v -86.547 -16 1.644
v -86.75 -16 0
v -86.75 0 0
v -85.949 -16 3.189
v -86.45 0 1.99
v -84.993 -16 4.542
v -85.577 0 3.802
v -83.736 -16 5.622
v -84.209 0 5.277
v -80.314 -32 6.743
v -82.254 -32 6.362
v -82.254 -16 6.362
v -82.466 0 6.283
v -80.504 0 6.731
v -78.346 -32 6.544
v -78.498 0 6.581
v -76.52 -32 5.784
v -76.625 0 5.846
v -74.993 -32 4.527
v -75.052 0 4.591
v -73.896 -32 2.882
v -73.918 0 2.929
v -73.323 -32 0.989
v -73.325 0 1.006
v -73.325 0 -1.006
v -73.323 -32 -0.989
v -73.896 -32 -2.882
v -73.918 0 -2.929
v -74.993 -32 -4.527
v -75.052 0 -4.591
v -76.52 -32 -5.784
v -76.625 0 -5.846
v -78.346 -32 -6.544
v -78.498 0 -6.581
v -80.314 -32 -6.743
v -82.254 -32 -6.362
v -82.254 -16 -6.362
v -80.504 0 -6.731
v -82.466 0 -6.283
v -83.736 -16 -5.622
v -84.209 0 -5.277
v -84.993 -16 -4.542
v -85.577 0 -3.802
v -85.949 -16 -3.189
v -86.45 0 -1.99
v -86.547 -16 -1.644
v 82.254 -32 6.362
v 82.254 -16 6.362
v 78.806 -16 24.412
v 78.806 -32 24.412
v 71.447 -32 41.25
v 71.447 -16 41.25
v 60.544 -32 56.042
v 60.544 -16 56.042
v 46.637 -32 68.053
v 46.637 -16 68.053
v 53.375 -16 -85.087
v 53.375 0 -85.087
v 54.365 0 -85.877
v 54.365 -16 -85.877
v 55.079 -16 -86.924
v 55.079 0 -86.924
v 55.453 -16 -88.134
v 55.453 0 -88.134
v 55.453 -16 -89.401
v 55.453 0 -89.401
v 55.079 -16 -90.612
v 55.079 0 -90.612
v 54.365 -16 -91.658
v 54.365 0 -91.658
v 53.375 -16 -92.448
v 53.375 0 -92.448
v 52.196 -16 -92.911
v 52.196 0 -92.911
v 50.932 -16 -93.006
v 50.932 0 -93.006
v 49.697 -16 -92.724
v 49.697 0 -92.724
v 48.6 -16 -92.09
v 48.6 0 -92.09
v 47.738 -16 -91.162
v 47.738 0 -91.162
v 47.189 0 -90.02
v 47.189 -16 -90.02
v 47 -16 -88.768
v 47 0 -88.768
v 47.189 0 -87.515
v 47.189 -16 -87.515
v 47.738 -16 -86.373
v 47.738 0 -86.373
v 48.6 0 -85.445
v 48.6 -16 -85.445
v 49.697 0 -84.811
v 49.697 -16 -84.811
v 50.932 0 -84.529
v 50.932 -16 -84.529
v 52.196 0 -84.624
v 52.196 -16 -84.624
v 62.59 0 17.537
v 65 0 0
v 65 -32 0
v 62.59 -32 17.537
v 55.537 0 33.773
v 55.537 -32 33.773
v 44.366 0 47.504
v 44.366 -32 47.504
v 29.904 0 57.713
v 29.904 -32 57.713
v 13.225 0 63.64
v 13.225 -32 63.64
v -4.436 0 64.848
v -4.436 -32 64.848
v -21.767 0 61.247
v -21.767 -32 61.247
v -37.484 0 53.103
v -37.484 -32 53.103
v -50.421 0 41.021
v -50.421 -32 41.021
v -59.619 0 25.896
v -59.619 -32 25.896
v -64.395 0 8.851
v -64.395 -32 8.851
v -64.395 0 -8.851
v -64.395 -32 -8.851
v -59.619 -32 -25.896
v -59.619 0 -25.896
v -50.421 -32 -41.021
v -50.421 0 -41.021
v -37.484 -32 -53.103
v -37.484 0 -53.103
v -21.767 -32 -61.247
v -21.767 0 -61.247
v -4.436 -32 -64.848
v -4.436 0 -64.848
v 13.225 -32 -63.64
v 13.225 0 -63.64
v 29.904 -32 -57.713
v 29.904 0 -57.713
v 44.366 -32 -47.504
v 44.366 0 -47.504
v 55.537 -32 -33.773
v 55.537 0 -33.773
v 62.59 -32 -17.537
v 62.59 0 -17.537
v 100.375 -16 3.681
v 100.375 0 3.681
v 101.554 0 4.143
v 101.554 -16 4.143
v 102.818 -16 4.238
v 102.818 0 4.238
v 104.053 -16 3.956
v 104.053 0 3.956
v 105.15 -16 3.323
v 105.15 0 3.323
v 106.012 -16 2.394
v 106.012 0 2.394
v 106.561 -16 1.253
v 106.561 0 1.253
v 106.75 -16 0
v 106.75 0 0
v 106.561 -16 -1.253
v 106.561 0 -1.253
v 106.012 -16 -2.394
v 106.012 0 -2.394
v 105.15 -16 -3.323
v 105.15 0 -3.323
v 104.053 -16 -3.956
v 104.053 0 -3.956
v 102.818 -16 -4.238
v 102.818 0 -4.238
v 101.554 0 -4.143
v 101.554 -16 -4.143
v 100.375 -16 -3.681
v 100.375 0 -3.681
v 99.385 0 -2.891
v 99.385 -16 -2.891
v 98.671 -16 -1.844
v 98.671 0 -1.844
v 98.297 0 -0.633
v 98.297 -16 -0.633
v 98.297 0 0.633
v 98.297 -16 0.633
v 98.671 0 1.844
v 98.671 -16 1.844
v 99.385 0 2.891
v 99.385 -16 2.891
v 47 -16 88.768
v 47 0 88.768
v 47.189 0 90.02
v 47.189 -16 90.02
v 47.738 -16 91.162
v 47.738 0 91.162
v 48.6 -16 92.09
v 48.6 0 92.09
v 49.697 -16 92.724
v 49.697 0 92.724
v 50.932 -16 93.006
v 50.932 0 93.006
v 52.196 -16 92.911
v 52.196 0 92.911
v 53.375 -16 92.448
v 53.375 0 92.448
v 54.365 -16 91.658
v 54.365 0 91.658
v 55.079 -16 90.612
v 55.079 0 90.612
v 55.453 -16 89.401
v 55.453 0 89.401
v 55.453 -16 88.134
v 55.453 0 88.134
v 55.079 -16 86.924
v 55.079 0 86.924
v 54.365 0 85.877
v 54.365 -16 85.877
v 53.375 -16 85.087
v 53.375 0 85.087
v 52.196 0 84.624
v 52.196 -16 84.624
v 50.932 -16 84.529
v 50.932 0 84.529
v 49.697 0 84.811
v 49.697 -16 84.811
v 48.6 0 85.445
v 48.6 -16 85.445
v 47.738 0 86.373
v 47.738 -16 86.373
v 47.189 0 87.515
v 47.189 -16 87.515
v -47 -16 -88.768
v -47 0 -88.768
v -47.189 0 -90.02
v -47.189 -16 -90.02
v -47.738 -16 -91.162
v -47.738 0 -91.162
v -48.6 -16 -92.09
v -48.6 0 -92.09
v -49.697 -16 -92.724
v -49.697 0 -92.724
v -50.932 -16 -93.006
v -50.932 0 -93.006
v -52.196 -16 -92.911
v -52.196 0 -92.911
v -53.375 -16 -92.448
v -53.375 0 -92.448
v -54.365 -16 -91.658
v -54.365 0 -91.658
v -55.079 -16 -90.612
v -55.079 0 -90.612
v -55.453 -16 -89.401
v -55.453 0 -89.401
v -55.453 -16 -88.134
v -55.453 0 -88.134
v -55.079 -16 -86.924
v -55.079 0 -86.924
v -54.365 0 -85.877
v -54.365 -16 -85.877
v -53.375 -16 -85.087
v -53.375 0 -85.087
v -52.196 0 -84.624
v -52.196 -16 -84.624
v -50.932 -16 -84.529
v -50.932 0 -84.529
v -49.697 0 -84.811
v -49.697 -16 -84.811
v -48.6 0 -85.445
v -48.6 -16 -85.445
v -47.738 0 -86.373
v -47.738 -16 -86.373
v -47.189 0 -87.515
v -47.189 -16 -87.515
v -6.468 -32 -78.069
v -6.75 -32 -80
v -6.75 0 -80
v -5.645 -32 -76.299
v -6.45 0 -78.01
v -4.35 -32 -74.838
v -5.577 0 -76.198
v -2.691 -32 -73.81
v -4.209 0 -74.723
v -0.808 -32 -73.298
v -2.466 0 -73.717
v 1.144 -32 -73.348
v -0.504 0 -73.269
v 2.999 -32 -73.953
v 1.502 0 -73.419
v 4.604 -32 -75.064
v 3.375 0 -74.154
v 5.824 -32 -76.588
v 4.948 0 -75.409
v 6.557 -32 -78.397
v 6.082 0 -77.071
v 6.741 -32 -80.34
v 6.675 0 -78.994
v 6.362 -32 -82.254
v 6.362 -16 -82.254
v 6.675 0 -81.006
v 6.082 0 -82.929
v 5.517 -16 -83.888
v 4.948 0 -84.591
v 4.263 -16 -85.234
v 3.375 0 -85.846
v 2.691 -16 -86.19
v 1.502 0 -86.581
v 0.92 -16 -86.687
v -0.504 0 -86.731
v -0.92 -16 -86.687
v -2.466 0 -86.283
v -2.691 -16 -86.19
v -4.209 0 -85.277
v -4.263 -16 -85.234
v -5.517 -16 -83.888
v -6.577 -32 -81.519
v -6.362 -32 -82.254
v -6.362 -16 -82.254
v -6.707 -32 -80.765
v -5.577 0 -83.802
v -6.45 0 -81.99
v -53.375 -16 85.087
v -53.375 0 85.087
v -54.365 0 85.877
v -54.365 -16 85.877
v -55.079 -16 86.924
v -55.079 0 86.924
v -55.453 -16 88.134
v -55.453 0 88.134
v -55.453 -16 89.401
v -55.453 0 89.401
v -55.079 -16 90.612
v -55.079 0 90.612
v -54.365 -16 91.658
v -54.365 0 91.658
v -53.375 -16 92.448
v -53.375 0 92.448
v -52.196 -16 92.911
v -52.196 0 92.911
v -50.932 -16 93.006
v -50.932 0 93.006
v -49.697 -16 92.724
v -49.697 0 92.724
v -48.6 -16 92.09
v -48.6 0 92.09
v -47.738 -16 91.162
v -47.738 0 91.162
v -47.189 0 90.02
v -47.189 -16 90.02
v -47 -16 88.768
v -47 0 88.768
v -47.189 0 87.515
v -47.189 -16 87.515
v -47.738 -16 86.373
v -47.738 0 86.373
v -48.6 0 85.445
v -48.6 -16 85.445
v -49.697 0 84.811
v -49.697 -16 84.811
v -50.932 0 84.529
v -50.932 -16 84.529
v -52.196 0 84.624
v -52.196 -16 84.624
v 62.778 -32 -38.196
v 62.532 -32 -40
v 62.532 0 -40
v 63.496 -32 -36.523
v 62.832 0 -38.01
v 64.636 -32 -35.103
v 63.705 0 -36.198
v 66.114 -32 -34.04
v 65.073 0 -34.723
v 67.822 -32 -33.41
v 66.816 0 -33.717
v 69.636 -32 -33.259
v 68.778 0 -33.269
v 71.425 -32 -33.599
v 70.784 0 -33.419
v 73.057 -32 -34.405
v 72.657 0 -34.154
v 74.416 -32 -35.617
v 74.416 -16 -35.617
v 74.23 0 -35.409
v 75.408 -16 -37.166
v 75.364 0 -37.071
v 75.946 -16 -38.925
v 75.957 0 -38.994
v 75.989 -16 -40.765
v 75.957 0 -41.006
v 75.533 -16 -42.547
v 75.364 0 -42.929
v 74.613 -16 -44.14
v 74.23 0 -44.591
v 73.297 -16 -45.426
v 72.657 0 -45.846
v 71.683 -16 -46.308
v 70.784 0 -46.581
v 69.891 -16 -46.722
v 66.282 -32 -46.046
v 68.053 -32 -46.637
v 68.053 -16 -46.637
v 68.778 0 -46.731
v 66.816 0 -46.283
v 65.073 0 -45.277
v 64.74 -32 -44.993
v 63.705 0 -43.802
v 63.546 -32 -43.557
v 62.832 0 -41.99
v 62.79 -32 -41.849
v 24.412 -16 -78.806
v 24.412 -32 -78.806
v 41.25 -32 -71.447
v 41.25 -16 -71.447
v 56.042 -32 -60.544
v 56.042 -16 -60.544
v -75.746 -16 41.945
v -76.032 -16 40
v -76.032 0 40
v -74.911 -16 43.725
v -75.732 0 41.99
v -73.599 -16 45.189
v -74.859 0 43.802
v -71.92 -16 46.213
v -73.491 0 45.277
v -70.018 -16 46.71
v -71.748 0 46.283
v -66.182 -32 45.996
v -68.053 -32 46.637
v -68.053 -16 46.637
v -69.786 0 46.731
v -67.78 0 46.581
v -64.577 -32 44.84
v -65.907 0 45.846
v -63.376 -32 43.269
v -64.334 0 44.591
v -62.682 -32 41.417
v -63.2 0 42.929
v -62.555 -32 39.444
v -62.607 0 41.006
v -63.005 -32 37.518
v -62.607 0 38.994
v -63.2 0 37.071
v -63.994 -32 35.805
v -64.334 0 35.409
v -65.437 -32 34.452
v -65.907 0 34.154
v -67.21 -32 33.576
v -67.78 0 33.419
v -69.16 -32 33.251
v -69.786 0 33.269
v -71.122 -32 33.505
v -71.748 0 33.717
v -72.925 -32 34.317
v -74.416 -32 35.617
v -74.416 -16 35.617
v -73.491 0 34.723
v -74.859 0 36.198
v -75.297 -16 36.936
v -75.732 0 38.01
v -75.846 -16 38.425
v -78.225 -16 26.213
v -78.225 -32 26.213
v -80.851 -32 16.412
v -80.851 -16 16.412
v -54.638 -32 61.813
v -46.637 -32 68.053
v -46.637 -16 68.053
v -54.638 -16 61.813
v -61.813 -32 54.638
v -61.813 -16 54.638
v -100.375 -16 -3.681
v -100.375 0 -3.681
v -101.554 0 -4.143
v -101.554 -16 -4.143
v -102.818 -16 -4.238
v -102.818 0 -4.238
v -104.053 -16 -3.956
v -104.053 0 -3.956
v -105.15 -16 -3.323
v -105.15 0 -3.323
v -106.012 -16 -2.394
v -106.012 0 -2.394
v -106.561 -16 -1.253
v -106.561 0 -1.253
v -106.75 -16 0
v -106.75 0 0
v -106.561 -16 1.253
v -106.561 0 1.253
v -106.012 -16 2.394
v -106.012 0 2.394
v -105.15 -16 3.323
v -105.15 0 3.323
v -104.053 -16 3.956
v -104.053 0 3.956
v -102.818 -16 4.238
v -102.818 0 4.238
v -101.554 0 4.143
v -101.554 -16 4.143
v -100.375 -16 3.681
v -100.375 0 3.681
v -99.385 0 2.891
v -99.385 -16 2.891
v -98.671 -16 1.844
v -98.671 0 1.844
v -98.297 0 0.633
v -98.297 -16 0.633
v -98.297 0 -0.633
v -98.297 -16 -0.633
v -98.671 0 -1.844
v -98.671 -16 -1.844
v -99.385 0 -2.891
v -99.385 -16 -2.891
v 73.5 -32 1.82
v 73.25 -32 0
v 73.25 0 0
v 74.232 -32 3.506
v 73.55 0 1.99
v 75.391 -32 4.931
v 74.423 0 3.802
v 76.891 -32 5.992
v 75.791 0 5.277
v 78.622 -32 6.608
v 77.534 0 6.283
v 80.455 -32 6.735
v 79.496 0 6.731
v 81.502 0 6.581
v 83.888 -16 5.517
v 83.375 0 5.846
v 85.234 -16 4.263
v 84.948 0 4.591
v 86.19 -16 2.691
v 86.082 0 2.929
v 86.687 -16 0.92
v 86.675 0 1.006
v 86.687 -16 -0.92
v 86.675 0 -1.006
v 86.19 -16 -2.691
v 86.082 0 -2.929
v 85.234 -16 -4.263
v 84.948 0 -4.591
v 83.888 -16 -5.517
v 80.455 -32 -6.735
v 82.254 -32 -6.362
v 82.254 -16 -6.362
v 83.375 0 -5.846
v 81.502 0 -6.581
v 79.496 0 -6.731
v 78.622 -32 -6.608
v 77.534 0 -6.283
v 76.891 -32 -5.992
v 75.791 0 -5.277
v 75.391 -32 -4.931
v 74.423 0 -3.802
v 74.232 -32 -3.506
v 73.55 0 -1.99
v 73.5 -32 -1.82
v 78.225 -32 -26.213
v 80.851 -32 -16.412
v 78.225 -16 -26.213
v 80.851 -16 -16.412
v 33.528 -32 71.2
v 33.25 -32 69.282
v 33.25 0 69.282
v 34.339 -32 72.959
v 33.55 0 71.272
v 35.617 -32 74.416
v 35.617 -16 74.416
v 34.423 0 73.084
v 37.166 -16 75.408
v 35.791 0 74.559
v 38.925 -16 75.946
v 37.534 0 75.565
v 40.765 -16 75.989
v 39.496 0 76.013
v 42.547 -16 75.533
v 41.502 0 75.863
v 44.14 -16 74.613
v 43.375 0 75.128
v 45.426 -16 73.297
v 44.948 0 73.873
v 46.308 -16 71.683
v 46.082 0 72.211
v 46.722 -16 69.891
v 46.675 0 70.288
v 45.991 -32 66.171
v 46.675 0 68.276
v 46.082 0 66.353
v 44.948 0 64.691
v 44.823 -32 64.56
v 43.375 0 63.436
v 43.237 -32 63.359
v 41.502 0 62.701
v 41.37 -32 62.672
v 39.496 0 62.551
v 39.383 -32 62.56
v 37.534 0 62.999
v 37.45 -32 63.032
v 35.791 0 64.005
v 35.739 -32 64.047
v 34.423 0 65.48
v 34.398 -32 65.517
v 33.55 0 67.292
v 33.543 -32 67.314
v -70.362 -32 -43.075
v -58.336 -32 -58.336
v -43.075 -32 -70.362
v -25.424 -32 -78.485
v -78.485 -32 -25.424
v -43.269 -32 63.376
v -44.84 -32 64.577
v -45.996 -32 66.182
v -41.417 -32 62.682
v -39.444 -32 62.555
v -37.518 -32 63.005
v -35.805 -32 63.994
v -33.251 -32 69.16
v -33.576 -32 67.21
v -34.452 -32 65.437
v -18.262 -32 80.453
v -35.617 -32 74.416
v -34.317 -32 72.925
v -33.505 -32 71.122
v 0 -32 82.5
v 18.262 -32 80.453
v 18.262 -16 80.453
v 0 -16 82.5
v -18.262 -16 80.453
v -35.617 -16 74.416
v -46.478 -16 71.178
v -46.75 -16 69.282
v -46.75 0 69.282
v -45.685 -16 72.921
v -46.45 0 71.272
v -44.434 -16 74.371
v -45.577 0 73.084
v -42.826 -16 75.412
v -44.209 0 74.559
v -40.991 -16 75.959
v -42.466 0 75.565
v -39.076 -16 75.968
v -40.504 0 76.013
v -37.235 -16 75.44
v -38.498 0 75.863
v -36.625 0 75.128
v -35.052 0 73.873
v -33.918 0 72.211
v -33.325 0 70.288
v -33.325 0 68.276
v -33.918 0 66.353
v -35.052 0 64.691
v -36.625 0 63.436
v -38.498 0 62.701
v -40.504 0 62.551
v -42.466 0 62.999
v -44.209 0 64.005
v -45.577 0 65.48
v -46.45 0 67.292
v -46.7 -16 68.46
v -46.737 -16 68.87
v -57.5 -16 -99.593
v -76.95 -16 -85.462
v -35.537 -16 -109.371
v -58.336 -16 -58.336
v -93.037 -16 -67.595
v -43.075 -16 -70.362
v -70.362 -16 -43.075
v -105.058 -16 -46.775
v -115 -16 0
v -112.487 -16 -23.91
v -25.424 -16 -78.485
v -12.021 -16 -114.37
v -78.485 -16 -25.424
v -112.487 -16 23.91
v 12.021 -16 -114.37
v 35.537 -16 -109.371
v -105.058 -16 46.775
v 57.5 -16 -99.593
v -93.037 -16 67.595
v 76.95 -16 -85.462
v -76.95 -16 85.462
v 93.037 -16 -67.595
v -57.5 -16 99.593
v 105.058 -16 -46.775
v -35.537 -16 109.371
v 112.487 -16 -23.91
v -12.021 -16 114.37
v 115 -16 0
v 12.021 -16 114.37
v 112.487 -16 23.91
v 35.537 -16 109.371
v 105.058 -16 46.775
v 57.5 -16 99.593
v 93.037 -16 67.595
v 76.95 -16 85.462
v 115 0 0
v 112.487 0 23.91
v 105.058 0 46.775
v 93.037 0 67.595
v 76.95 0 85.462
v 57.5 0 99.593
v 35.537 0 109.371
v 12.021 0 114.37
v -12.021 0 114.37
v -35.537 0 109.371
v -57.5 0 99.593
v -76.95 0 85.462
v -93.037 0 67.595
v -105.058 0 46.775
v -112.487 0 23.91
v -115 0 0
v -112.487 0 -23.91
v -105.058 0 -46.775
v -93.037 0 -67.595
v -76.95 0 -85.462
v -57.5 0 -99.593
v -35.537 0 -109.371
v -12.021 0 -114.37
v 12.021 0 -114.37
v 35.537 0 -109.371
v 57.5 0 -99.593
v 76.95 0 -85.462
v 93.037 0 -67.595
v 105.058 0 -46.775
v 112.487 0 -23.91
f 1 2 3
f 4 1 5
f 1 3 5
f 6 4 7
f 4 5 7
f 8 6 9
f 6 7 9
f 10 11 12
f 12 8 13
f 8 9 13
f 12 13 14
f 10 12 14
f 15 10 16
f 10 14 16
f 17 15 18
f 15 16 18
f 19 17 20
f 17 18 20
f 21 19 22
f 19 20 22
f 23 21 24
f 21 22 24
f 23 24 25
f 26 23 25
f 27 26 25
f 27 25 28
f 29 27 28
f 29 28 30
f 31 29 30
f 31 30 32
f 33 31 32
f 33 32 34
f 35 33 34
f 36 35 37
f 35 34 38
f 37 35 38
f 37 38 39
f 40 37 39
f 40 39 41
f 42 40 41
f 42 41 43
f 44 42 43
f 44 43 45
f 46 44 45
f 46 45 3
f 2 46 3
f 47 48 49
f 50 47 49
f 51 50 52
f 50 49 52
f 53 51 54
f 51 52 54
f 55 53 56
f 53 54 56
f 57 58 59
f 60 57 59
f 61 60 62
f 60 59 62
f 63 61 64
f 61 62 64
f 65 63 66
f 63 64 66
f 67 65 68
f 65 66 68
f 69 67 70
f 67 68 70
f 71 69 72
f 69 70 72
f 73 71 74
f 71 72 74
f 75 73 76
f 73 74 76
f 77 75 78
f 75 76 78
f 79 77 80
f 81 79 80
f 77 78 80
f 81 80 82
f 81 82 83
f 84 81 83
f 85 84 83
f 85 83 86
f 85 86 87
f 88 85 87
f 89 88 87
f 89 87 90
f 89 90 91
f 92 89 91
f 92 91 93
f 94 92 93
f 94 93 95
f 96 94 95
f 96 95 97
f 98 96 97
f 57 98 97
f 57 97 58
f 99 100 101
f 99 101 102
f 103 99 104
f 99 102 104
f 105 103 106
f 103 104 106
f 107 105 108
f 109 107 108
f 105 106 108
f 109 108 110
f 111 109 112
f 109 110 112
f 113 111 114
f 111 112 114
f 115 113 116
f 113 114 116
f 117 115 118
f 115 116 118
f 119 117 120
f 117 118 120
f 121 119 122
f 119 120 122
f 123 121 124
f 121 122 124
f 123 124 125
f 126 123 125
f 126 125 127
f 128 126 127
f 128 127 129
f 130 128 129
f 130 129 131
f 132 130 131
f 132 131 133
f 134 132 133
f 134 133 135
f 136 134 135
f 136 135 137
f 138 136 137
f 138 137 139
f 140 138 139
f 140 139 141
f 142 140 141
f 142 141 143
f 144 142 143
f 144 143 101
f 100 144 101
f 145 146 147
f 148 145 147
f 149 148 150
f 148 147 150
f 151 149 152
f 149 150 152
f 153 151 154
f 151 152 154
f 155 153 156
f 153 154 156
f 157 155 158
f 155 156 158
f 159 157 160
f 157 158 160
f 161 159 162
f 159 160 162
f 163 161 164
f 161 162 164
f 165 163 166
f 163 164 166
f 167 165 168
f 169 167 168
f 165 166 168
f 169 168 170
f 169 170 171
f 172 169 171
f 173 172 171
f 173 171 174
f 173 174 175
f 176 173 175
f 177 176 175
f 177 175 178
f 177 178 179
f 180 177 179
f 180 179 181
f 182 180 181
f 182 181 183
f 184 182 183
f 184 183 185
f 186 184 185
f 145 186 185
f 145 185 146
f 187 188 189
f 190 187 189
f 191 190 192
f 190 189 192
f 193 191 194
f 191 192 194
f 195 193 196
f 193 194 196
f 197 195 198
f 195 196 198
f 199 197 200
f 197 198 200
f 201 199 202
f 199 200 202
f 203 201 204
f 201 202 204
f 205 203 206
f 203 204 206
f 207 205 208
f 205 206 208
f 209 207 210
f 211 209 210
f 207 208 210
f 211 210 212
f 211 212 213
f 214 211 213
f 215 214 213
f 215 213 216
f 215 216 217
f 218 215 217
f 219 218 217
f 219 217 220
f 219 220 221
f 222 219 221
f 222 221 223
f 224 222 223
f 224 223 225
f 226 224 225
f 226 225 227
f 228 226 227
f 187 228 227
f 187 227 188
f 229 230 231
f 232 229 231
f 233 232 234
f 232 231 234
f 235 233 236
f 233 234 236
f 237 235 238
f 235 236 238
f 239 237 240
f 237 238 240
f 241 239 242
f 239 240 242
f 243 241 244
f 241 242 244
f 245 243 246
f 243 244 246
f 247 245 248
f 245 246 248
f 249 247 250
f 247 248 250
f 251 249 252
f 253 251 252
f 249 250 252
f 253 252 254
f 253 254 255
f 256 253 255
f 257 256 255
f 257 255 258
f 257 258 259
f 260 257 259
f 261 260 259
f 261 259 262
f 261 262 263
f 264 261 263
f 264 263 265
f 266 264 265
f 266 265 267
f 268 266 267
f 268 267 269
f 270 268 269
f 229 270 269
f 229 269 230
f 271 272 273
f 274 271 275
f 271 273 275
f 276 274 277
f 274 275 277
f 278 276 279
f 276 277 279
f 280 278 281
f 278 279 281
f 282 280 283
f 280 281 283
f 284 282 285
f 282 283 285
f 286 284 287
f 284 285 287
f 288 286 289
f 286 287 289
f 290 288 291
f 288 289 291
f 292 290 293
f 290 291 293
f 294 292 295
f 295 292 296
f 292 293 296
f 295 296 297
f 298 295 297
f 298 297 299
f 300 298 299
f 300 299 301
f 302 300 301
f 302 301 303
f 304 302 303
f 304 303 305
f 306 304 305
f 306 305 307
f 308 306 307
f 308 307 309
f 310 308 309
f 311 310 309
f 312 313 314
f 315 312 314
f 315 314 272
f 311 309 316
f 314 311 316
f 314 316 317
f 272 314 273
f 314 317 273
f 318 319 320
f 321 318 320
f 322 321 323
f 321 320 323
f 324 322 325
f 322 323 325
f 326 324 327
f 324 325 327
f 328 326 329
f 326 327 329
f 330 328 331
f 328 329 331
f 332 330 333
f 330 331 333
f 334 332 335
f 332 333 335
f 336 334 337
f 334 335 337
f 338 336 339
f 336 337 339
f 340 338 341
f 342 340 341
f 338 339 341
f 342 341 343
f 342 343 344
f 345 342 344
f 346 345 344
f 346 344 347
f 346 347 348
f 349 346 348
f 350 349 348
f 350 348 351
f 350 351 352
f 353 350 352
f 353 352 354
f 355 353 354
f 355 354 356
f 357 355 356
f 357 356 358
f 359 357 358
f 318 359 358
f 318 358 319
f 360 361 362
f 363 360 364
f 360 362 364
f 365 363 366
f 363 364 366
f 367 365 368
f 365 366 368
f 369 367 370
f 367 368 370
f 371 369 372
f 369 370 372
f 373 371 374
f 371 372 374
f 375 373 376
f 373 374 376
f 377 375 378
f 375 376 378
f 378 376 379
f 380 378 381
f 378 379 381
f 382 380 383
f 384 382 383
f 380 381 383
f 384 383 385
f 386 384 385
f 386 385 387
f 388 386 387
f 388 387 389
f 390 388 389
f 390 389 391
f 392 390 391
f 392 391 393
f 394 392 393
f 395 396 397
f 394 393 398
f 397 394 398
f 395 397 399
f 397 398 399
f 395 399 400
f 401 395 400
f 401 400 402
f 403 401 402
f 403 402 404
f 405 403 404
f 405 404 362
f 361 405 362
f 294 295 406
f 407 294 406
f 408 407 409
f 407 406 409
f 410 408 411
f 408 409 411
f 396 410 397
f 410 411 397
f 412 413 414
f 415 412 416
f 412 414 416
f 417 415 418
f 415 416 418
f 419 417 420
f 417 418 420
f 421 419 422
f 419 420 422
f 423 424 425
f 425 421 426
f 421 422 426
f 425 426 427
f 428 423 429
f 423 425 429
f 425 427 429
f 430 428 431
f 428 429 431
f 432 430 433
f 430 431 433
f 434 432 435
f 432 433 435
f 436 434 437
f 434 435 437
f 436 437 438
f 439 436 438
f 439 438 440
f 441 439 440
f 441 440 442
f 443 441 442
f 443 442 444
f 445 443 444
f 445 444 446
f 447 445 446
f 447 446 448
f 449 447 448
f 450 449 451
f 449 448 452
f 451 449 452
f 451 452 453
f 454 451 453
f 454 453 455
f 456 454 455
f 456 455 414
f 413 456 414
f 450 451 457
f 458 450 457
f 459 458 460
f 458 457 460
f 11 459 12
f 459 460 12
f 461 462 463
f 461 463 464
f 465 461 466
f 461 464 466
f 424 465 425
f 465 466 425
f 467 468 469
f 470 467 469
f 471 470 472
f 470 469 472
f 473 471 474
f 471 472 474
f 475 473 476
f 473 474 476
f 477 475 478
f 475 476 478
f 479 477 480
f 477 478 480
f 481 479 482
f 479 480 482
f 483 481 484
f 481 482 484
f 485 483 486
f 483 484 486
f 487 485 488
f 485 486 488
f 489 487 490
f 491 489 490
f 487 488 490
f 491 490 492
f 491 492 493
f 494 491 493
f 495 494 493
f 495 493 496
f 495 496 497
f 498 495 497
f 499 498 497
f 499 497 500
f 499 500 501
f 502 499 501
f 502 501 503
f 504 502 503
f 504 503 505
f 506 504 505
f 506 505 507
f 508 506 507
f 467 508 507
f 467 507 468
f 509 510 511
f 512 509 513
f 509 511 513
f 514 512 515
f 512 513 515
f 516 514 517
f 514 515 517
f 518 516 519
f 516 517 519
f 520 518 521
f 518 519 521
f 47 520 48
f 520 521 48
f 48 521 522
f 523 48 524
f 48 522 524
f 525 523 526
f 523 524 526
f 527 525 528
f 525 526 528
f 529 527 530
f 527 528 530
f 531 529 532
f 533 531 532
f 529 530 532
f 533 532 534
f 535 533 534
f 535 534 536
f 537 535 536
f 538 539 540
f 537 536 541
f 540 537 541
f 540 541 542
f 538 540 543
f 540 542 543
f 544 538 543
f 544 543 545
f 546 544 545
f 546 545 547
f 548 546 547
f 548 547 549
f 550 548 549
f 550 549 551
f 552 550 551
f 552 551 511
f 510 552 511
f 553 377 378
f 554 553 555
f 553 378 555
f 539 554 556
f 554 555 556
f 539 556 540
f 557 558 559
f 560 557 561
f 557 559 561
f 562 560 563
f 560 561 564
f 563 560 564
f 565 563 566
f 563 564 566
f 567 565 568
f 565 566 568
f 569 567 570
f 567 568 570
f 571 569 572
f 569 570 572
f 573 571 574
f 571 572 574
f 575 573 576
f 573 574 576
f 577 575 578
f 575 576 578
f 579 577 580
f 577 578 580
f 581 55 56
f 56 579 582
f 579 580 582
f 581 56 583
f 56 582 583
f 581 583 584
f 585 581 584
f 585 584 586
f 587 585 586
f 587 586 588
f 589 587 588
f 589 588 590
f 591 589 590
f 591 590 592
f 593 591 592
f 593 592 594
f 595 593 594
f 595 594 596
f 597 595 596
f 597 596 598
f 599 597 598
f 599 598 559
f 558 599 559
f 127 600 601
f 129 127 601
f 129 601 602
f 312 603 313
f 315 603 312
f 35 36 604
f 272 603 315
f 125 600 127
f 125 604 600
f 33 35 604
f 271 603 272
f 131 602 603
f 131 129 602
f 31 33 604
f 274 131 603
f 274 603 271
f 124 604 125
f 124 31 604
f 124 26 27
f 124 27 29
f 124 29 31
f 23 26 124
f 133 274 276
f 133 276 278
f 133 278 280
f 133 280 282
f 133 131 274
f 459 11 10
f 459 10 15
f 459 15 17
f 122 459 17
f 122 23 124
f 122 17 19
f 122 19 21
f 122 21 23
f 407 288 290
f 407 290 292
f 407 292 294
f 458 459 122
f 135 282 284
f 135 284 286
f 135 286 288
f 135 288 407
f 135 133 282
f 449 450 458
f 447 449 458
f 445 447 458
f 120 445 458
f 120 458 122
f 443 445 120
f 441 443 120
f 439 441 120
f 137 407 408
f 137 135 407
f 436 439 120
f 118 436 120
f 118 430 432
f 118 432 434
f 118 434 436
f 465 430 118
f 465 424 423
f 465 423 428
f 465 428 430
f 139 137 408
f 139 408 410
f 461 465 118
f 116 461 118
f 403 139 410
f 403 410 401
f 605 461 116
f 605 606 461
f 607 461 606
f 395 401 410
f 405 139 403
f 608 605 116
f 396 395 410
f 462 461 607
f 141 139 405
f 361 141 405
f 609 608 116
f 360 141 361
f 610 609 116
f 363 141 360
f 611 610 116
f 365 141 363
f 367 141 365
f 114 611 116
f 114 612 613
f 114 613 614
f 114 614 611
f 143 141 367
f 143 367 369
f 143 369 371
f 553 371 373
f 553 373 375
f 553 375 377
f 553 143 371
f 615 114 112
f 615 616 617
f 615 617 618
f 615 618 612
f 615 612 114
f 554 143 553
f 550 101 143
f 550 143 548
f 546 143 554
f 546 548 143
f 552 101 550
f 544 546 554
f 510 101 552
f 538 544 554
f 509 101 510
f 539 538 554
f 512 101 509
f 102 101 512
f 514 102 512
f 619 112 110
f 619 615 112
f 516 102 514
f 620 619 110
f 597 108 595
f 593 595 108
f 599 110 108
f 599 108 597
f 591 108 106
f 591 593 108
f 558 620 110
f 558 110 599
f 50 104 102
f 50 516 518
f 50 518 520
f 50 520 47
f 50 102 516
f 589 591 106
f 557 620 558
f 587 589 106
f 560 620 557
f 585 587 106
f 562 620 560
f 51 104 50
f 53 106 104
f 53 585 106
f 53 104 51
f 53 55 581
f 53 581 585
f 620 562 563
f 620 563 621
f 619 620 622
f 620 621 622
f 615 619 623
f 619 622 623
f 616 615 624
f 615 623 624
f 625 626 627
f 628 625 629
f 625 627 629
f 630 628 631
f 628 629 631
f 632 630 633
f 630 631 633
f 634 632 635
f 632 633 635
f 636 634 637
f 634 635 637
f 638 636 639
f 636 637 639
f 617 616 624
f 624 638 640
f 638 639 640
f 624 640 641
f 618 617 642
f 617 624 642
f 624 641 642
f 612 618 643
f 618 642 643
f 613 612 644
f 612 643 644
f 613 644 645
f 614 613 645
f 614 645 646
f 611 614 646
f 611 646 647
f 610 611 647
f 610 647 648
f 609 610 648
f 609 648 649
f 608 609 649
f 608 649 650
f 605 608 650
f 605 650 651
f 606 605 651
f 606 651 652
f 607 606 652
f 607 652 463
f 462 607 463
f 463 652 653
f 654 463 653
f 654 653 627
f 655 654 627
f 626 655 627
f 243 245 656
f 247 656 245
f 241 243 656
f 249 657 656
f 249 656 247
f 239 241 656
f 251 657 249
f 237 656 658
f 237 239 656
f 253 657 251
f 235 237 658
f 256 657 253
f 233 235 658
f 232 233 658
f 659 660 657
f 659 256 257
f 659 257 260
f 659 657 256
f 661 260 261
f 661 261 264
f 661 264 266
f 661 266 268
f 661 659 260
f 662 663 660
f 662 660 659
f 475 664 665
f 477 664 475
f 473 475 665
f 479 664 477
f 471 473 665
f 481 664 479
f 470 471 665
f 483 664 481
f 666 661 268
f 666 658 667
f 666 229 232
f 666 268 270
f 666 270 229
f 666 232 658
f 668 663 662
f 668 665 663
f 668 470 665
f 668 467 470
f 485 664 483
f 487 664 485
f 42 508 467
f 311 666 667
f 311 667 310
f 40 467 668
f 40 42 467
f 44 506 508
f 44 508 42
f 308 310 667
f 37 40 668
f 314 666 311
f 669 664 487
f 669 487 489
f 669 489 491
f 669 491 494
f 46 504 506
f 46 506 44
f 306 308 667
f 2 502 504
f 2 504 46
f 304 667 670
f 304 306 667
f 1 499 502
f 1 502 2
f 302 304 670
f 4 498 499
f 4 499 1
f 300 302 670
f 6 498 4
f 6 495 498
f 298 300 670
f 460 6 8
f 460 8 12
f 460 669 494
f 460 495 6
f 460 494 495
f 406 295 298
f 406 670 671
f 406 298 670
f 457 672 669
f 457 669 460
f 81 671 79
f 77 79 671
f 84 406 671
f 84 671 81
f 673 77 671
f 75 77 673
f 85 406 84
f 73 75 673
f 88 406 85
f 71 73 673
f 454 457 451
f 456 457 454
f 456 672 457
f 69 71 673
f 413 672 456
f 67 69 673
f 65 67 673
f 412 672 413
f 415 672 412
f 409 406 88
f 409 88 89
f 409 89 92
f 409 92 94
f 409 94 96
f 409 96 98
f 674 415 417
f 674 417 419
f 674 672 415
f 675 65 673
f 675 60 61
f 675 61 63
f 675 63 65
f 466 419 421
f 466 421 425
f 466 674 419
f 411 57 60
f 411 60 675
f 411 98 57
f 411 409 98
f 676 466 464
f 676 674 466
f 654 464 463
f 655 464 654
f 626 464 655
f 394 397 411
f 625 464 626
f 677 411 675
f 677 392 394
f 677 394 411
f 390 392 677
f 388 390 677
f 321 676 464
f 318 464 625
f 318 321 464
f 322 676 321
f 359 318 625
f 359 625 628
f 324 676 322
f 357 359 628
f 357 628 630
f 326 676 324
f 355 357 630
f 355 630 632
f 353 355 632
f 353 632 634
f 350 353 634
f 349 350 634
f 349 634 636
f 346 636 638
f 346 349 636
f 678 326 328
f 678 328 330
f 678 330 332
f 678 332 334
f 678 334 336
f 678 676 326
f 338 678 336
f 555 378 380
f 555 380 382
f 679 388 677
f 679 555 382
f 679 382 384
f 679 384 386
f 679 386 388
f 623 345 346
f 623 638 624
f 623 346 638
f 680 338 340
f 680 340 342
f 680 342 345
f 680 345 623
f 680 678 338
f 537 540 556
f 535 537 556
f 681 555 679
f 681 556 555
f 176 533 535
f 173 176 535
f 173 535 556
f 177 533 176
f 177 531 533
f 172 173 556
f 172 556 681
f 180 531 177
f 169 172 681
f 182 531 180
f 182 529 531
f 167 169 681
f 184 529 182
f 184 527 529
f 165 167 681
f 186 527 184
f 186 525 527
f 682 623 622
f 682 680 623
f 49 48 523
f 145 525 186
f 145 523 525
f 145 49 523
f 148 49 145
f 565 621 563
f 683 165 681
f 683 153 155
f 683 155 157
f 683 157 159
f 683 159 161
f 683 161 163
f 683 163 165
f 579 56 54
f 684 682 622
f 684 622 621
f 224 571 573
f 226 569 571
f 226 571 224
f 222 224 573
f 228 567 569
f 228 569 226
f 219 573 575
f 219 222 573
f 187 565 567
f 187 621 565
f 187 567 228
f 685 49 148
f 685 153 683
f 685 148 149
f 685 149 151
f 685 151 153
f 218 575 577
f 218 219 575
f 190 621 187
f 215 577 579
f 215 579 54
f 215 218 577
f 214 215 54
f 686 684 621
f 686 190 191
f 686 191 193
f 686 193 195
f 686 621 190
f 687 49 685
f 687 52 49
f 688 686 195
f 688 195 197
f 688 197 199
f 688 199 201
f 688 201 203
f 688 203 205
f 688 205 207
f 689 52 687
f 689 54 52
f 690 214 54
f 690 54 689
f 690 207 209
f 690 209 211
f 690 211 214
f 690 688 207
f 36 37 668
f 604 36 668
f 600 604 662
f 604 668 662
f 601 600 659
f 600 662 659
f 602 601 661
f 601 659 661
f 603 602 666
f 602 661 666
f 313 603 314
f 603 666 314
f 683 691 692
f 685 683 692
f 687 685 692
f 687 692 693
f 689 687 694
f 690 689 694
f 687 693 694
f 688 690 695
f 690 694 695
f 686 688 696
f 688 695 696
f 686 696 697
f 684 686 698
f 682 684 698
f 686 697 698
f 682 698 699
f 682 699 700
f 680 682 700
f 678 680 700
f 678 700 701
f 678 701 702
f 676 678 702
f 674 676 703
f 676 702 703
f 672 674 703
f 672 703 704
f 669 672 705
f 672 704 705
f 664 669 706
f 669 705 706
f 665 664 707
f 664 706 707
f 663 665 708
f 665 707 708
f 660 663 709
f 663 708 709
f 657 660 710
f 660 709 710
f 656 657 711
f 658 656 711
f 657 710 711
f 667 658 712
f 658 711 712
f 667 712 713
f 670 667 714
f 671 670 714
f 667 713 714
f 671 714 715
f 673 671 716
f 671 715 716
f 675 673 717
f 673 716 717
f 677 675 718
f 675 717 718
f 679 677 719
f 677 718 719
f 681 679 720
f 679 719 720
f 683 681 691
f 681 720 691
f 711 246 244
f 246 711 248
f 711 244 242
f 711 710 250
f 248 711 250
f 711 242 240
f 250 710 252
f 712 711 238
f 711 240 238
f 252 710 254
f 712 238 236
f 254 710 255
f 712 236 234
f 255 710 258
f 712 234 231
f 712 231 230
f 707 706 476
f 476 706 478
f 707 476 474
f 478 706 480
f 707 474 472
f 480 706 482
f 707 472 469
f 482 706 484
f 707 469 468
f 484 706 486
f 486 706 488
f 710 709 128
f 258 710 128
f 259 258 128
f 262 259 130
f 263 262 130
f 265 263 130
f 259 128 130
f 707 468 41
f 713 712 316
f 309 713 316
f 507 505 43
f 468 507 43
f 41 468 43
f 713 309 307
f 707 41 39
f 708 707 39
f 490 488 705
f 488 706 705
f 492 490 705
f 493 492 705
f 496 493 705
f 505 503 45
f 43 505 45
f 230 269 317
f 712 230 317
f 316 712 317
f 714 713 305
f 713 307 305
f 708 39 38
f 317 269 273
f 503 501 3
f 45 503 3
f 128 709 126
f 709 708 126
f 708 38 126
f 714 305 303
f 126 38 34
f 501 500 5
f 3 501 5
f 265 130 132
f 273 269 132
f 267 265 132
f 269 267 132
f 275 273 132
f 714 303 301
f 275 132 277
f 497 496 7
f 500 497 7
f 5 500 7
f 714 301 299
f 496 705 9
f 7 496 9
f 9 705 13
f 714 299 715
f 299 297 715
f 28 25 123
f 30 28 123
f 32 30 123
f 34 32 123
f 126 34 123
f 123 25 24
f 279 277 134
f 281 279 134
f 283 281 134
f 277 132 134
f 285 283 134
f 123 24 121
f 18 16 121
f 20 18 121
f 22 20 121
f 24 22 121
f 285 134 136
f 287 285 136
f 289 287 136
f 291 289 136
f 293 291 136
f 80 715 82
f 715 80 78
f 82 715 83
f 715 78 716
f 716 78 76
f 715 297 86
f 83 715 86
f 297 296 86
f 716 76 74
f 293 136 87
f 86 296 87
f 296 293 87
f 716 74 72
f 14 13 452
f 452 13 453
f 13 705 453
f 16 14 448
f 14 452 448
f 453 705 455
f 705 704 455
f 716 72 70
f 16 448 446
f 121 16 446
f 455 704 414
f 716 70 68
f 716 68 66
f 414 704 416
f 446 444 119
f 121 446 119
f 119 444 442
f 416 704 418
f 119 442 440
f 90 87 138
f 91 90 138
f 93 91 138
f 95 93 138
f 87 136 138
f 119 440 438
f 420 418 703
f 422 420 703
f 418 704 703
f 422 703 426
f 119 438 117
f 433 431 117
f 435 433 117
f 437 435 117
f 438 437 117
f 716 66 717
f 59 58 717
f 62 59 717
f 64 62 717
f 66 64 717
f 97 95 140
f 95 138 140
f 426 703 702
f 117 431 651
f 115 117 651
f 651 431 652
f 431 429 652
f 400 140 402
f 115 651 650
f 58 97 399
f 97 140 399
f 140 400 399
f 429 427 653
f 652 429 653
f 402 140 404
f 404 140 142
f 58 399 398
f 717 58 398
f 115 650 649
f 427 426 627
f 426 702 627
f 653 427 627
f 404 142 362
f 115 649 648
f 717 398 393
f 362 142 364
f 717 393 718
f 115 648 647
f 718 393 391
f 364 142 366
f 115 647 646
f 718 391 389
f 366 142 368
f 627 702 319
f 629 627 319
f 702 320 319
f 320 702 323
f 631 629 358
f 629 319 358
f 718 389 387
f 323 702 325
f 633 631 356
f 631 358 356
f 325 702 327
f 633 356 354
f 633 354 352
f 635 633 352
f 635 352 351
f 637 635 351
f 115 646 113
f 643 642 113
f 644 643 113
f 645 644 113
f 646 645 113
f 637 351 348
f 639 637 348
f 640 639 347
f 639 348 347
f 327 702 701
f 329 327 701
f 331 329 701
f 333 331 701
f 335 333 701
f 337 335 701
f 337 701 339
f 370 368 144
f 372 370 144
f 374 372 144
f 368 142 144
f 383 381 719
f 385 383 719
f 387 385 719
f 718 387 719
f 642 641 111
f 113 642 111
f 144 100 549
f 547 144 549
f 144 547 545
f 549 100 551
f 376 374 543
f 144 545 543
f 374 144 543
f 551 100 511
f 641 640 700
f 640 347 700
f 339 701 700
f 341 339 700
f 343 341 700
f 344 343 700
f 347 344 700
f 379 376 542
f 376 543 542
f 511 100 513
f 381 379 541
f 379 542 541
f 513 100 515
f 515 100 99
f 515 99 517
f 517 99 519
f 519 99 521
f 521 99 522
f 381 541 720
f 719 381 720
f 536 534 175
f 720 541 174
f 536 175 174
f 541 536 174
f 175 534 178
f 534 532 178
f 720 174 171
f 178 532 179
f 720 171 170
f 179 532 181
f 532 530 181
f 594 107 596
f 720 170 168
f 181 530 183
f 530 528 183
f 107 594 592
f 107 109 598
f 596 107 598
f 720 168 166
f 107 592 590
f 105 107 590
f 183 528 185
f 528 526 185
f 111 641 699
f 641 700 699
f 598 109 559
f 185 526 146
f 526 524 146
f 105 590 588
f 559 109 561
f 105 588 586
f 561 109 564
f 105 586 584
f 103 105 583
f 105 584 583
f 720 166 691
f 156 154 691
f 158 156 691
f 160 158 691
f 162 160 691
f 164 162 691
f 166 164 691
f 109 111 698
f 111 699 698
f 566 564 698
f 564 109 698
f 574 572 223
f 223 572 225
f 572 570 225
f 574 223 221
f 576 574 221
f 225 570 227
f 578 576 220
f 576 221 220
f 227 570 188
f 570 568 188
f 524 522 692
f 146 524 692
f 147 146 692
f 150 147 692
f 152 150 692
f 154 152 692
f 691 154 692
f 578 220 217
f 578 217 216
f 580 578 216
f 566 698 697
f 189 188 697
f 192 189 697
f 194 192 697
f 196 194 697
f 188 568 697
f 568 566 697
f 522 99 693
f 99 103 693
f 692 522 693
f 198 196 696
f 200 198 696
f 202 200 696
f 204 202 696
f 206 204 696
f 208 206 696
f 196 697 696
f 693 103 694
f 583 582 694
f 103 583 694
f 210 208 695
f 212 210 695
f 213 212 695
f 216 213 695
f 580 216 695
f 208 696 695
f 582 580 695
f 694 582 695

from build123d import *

# Parameters (mm, degrees)
F0_R            = 115
F1_DEPTH        = 16
F2_R            = 82.5
F3_DEPTH        = 16
F4_R            = 65
F5_DEPTH        = 32.001
F7_D            = 13.5
F9_D            = 8.5
F9_COPIES_COUNT = 6


# Not quite as in the source:
# - a pattern or mirror of a feature is missing from the dataset's text; its kind, count and spacing are read off the source's solid


with BuildPart() as f1:
    # F0 (on Front) → F1 (new body)
    with BuildSketch(Plane.XZ):
        Circle(F0_R)
    extrude(amount=F1_DEPTH)

    # F2 (on face) → F3 (join)
    with BuildSketch(Plane.XZ.offset(16)):
        Circle(F2_R)
    extrude(amount=F3_DEPTH)

    # F4 (on face) → F5 (cut, through all)
    with BuildSketch(Plane.XZ.offset(32)):
        Circle(F4_R)
    extrude(amount=-F5_DEPTH, mode=Mode.SUBTRACT)

    # F7 (through all)
    with Locations(Plane.XZ.offset(32)):
        with Locations((40, 69.2820323028), (80, 0), (69.2820323028, -40), (0, -80), (-80, 0), (-69.2820323028, 40), (-40, 69.2820323028)):
            Hole(F7_D / 2)

    # F9 (through all)
    with Locations(Plane.XZ.offset(16)):
        with Locations((51.25, 88.7676038879)):
            f9 = Hole(F9_D / 2)

    # F9_copies: F9 ×6 about axis
    f9_copies_axis = Axis((0, 0, 0), (0, 1, 0))
    for i in range(1, F9_COPIES_COUNT):
        add(f9.rotate(f9_copies_axis, i * 360 / F9_COPIES_COUNT), mode=Mode.SUBTRACT)


solid = f1.part
